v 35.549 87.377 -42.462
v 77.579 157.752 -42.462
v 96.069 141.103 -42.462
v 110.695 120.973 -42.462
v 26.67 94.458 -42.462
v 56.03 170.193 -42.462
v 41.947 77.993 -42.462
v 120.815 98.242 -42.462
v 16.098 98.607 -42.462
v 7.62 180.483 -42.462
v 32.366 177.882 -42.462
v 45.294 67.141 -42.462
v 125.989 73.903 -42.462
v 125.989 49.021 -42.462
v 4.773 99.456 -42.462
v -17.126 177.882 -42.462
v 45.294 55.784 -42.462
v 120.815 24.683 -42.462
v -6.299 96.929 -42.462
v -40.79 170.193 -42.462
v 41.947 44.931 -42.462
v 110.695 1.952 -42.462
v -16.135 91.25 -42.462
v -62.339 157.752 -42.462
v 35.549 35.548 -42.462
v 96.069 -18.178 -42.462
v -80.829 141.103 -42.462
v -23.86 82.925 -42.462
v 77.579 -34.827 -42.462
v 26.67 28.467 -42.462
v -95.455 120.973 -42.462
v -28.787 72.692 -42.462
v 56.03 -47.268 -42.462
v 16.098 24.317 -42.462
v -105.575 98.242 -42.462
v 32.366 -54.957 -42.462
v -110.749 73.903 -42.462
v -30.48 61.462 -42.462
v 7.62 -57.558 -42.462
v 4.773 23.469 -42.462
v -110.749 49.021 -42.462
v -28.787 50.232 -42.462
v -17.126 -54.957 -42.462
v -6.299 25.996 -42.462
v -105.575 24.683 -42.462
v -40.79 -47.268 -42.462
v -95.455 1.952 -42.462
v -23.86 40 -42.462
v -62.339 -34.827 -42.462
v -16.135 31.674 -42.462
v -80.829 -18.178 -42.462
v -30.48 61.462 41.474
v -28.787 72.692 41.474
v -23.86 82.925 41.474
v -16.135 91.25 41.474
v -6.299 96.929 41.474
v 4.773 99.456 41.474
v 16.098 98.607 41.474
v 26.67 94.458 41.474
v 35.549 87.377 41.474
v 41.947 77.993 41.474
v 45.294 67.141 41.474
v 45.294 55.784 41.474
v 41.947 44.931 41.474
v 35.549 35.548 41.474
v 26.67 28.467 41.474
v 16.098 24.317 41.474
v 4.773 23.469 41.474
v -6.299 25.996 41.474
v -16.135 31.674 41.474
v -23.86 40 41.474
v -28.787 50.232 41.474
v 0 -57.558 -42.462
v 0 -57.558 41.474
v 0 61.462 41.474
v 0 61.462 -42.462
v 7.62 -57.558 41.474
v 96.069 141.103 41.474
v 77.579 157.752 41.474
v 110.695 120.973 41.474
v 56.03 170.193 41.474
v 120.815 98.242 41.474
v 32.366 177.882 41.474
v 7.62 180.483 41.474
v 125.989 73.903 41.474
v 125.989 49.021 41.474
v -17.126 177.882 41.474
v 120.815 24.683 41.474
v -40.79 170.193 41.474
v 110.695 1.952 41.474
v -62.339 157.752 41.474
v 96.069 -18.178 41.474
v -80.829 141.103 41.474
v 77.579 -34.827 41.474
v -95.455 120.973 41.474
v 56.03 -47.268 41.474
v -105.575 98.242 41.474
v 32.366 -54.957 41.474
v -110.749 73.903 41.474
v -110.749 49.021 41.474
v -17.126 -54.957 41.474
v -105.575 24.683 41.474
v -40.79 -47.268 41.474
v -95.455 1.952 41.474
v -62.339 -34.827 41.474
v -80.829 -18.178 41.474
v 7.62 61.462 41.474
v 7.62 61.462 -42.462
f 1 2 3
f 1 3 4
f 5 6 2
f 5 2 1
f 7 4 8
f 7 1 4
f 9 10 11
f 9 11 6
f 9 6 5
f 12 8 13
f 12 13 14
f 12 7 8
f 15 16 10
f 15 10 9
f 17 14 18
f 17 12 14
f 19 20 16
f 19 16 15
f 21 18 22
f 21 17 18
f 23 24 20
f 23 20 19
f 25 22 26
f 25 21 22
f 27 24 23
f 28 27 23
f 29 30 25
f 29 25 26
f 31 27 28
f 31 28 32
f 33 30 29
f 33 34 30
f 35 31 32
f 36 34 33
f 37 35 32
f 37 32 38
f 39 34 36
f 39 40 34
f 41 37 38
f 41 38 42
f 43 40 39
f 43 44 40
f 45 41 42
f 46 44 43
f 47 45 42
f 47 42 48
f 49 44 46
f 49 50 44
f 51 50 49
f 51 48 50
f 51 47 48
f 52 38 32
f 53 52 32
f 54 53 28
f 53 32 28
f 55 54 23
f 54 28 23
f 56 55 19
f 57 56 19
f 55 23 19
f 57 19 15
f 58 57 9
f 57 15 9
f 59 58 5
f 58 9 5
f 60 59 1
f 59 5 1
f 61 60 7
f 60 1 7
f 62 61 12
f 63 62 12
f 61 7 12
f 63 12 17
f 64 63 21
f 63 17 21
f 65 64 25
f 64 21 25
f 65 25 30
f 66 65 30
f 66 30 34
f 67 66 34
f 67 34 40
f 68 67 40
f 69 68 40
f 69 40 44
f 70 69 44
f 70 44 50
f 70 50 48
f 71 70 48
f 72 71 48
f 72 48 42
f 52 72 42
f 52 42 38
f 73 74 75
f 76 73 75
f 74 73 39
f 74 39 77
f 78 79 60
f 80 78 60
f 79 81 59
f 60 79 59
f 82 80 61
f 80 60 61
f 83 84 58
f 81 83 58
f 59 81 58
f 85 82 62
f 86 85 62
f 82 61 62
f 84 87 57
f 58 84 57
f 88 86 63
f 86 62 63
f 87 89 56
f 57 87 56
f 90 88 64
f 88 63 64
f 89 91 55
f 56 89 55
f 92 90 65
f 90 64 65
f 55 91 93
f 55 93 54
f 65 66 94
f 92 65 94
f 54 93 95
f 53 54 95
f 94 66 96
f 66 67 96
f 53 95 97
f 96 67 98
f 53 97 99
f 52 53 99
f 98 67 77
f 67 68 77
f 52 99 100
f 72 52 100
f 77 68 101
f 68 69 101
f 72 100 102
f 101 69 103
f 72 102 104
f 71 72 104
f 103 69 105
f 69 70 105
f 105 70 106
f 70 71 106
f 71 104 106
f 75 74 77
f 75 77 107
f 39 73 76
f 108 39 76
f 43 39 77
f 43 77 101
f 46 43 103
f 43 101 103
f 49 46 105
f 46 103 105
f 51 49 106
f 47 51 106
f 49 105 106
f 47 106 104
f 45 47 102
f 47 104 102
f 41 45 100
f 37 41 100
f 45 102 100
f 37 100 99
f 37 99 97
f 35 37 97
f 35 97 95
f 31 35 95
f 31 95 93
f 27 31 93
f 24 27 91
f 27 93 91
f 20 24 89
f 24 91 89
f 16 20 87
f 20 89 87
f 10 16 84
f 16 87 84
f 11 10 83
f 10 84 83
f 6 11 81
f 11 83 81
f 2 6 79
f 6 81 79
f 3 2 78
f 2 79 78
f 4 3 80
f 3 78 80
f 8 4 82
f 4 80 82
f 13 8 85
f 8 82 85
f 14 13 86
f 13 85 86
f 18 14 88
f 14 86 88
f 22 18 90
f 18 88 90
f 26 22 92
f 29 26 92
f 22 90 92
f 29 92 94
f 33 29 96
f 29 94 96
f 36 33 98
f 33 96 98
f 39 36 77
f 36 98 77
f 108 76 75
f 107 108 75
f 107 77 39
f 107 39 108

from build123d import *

# Parameters (mm, degrees)
F0_W      = 119.0205290914
F0_H      = 83.936393261
F1_DEPTH  = 7.62
F1_FACE_W = 119.0205290914
F1_FACE_H = 83.936393261
F4_D      = 76.2


with BuildPart() as f1:
    # F0 (on Right) → F1 (new body)
    with BuildSketch(Plane.YZ):
        with Locations((1.9519850612, -0.4941523075)):
            Rectangle(F0_W, F0_H)
    extrude(amount=F1_DEPTH)


with BuildPart() as f2:
    # F1_face (on face) → F2 (revolve)
    with BuildSketch(Plane(origin=(7.62, 1.9519850612, -0.4941523075), x_dir=(0, 1, 0), z_dir=(1, 0, 0))):
        Rectangle(F1_FACE_W, F1_FACE_H)
    revolve(axis=Axis((7.62, 61.4622496068, -0.4941523075), (0, 0, -1)))

    # F4 (through all)
    with Locations(Plane.XY.offset(41.474044323)):
        with Locations((7.62, 61.4622496068)):
            Hole(F4_D / 2)


solid = Compound([f1.part, f2.part])
